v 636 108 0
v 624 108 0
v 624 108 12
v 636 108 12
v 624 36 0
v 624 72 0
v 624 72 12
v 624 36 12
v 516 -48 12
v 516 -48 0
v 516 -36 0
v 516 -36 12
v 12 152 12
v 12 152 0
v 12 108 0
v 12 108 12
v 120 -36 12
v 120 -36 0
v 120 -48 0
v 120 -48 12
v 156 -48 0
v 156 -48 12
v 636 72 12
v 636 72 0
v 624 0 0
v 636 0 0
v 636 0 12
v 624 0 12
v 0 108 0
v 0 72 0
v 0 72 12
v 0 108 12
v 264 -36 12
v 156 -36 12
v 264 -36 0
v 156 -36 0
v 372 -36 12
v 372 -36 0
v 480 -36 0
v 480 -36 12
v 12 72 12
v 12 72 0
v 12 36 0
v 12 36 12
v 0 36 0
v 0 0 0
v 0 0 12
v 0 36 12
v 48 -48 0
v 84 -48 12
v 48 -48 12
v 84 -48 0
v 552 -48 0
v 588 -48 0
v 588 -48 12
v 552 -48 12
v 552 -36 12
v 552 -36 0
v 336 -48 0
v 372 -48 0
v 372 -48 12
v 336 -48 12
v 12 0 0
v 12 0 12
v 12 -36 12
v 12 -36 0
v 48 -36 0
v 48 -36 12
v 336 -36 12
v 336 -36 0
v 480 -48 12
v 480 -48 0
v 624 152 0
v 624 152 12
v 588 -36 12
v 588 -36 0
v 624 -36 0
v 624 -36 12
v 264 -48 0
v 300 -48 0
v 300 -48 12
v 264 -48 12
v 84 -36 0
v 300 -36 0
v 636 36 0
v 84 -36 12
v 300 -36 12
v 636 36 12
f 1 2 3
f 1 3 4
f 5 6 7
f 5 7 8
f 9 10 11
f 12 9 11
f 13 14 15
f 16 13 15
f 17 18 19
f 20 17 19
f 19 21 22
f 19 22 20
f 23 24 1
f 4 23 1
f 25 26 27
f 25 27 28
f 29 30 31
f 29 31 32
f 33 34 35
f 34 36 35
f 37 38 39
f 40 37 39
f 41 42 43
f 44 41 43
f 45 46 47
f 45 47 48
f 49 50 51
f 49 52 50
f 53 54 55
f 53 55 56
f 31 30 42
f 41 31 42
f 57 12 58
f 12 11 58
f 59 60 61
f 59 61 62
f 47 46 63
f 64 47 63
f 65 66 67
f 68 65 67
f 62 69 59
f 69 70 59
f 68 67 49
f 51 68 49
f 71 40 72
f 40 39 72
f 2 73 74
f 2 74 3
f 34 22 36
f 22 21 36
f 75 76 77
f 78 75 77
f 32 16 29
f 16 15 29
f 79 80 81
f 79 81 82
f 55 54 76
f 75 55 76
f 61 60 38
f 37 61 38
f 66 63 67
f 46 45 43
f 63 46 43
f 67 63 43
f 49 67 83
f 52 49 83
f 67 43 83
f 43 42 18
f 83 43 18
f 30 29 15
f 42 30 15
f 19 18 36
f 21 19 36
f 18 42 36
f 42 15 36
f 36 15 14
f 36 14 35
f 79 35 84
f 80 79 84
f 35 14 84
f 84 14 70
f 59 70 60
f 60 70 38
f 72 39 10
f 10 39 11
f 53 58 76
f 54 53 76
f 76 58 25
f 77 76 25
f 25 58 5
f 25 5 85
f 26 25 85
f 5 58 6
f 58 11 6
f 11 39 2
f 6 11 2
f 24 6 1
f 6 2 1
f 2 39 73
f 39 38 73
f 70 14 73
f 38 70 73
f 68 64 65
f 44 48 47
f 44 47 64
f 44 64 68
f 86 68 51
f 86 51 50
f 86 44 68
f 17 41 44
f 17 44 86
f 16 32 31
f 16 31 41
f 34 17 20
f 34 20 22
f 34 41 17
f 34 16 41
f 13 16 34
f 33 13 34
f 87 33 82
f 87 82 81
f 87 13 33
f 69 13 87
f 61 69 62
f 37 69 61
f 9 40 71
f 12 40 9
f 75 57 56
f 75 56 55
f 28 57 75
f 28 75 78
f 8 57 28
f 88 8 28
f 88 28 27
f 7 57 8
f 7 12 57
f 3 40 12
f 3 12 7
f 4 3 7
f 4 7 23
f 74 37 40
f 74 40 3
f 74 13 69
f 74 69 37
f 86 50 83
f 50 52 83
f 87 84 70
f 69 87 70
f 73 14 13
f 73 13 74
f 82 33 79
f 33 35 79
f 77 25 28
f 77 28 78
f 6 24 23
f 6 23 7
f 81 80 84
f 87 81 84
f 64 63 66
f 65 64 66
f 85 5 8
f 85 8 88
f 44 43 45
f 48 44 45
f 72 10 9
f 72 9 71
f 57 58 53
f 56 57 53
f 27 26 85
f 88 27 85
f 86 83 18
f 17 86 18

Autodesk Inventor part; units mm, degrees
ref_plane "YZ Plane" through (0, 0, 0) normal (1, 0, 0) x (0, 1, 0)
ref_plane "XZ Plane" through (0, 0, 0) normal (0, 1, 0) x (-1, 0, 0)
ref_plane "XY Plane" through (0, 0, 0) normal (0, 0, 1) x (1, 0, 0)
ref_plane "Work Plane1" through (0, 0, 0) normal (0, 0, 1) x (1, 0, 0)
sketch "Sketch1" plane through (0, 0, 0) normal (0, 0, 1) x (1, 0, 0)
  line L0 (0, 72) -> (12, 72)
  line L1 (12, 108) -> (12, 72)
  line L2 (12, 152) -> (12, 108)
  line L3 (0, 152) -> (12, 152)
  line L4 (0, 108) -> (0, 152)
  line L5 (12, 108) -> (0, 108)
  line L6 (0, 72) -> (0, 108)
  line L7 (0, 36) -> (0, 72)
  line L8 (12, 36) -> (0, 36)
  line L9 (12, 36) -> (12, 0)
  line L10 (0, 0) -> (12, 0)
  line L11 (0, -36) -> (0, 0)
  line L12 (12, -36) -> (0, -36)
  line L13 (12, 0) -> (12, -36)
  line L14 (12, 72) -> (12, 36)
  line L15 (0, 0) -> (0, 36)
  line L16 (636, -36) -> (636, -48)
  line L17 (636, -48) -> (588, -48)
  line L18 (588, -48) -> (588, -36)
  line L19 (552, -36) -> (588, -36)
  line L20 (552, -36) -> (552, -48)
  line L21 (552, -48) -> (516, -48)
  line L22 (516, -48) -> (516, -36)
  line L23 (480, -36) -> (516, -36)
  line L24 (480, -36) -> (480, -48)
  line L25 (480, -48) -> (444, -48)
  line L26 (444, -48) -> (444, -36)
  line L27 (408, -36) -> (444, -36)
  line L28 (408, -36) -> (408, -48)
  line L29 (408, -48) -> (372, -48)
  line L30 (372, -48) -> (372, -36)
  line L31 (336, -36) -> (372, -36)
  line L32 (336, -36) -> (336, -48)
  line L33 (336, -48) -> (300, -48)
  line L34 (300, -48) -> (300, -36)
  line L35 (264, -36) -> (300, -36)
  line L36 (264, -36) -> (264, -48)
  line L37 (264, -48) -> (228, -48)
  line L38 (228, -48) -> (228, -36)
  line L39 (192, -36) -> (228, -36)
  line L40 (192, -36) -> (192, -48)
  line L41 (192, -48) -> (156, -48)
  line L42 (156, -48) -> (156, -36)
  line L43 (120, -36) -> (156, -36)
  line L44 (120, -36) -> (120, -48)
  line L45 (120, -48) -> (84, -48)
  line L46 (84, -48) -> (84, -36)
  line L47 (48, -36) -> (84, -36)
  line L48 (48, -36) -> (48, -48)
  line L49 (48, -48) -> (0, -48)
  line L50 (0, -48) -> (0, -36)
  line L51 (0, -36) -> (48, -36)
  line L52 (588, -36) -> (636, -36)
  line L53 (588, -48) -> (552, -48)
  line L54 (516, -36) -> (552, -36)
  line L55 (516, -48) -> (480, -48)
  line L56 (444, -36) -> (480, -36)
  line L57 (444, -48) -> (408, -48)
  line L58 (372, -36) -> (408, -36)
  line L59 (372, -48) -> (336, -48)
  line L60 (300, -36) -> (336, -36)
  line L61 (300, -48) -> (264, -48)
  line L62 (228, -36) -> (264, -36)
  line L63 (228, -48) -> (192, -48)
  line L64 (156, -36) -> (192, -36)
  line L65 (156, -48) -> (120, -48)
  line L66 (84, -36) -> (120, -36)
  line L67 (84, -48) -> (48, -48)
  line L68 (12, 152) -> (624, 152)
  line L69 (636, -36) -> (12, -36)
  line L70 (12, -36) -> (12, 152)
  line L71 (318, 152) -> (318, 58) construction
  line L72 (318, 58) -> (636, 58) construction
  line L73 (12, 152) -> (0, 152)
  line L74 (636, 152) -> (636, 164)
  line L75 (636, 164) -> (588, 164)
  line L76 (588, 164) -> (588, 152)
  line L77 (552, 152) -> (588, 152)
  line L78 (552, 152) -> (552, 164)
  line L79 (552, 164) -> (516, 164)
  line L80 (516, 164) -> (516, 152)
  line L81 (480, 152) -> (516, 152)
  line L82 (480, 152) -> (480, 164)
  line L83 (480, 164) -> (444, 164)
  line L84 (444, 164) -> (444, 152)
  line L85 (408, 152) -> (444, 152)
  line L86 (408, 152) -> (408, 164)
  line L87 (408, 164) -> (372, 164)
  line L88 (372, 164) -> (372, 152)
  line L89 (336, 152) -> (372, 152)
  line L90 (336, 152) -> (336, 164)
  line L91 (336, 164) -> (300, 164)
  line L92 (300, 164) -> (300, 152)
  line L93 (264, 152) -> (300, 152)
  line L94 (264, 152) -> (264, 164)
  line L95 (264, 164) -> (228, 164)
  line L96 (228, 164) -> (228, 152)
  line L97 (192, 152) -> (228, 152)
  line L98 (192, 152) -> (192, 164)
  line L99 (192, 164) -> (156, 164)
  line L100 (156, 164) -> (156, 152)
  line L101 (120, 152) -> (156, 152)
  line L102 (120, 152) -> (120, 164)
  line L103 (120, 164) -> (84, 164)
  line L104 (84, 164) -> (84, 152)
  line L105 (48, 152) -> (84, 152)
  line L106 (48, 152) -> (48, 164)
  line L107 (48, 164) -> (0, 164)
  line L108 (0, 164) -> (0, 152)
  line L109 (0, 152) -> (48, 152)
  line L110 (588, 152) -> (636, 152)
  line L111 (588, 164) -> (552, 164)
  line L112 (516, 152) -> (552, 152)
  line L113 (516, 164) -> (480, 164)
  line L114 (444, 152) -> (480, 152)
  line L115 (444, 164) -> (408, 164)
  line L116 (372, 152) -> (408, 152)
  line L117 (372, 164) -> (336, 164)
  line L118 (300, 152) -> (336, 152)
  line L119 (300, 164) -> (264, 164)
  line L120 (228, 152) -> (264, 152)
  line L121 (228, 164) -> (192, 164)
  line L122 (156, 152) -> (192, 152)
  line L123 (156, 164) -> (120, 164)
  line L124 (84, 152) -> (120, 152)
  line L125 (84, 164) -> (48, 164)
  line L126 (636, 152) -> (12, 152)
  line L127 (318, 152) -> (318, -36) construction
  line L128 (636, 72) -> (624, 72)
  line L129 (624, 108) -> (624, 72)
  line L130 (624, 152) -> (624, 108)
  line L131 (636, 152) -> (624, 152)
  line L132 (636, 108) -> (636, 152)
  line L133 (624, 108) -> (636, 108)
  line L134 (636, 72) -> (636, 108)
  line L135 (636, 36) -> (636, 72)
  line L136 (624, 36) -> (636, 36)
  line L137 (624, 36) -> (624, 0)
  line L138 (636, 0) -> (624, 0)
  line L139 (636, -36) -> (636, 0)
  line L140 (624, -36) -> (636, -36)
  line L141 (624, 0) -> (624, -36)
  line L142 (624, 72) -> (624, 36)
  line L143 (636, 0) -> (636, 36)
  line L144 (636, -48) -> (636, -36)
  line L145 (624, -36) -> (624, 152)
  line L146 (624, 152) -> (636, 152)
  line L147 (636, 164) -> (636, 152)
extrude "Extrusion1" add sketch "Sketch1" along normal blind 12 contours L6 L5 L1 L0 | L1 L2 L68 L130 L129 L142 L137 L141 L52 L19 L54 L23 L56 L27 L58 L31 L60 L35 L62 L39 L64 L43 L66 L47 L51 L13 L9 L14 | L8 L9 L10 L15 | L47 L46 L67 L48 | L43 L42 L65 L44 | L35 L34 L61 L36 | L31 L30 L59 L32 | L23 L22 L55 L24 | L19 L18 L53 L20 | L133 L134 L128 L129 | L137 L136 L143 L138
ref_plane "Work Plane2" through (0, -113.0256, -190.9643) normal (-1, 0, 0) x (0, -0.5, 0.866)
ref_plane "Work Plane3" through (0, -113.0256, -190.9643) normal (-1, 0, 0) x (0, -0.5, 0.866)
sketch "Sketch3" plane through (0, 0, 12) normal (0, 0, 1) x (1, 0, 0)
  line L0 (48, -36) -> (48, -48) projected
  line L1 (48, -48) -> (84, -48) projected
  line L2 (84, -48) -> (84, -36) projected
  line L3 (84, -36) -> (120, -36) projected
  line L4 (120, -36) -> (120, -48) projected
  line L5 (120, -48) -> (156, -48) projected
  line L6 (156, -48) -> (156, -36) projected
  line L7 (156, -36) -> (264, -36) projected
  line L8 (264, -36) -> (264, -48) projected
  line L9 (264, -48) -> (300, -48) projected
  line L10 (300, -48) -> (300, -36) projected
  line L11 (300, -36) -> (336, -36) projected
  line L12 (336, -36) -> (336, -48) projected
  line L13 (336, -48) -> (372, -48) projected
  line L14 (372, -48) -> (372, -36) projected
  line L15 (372, -36) -> (480, -36) projected
  line L16 (480, -36) -> (480, -48) projected
  line L17 (480, -48) -> (516, -48) projected
  line L18 (516, -48) -> (516, -36) projected
  line L19 (516, -36) -> (552, -36) projected
  line L20 (552, -36) -> (552, -48) projected
  line L21 (552, -48) -> (588, -48) projected
  line L22 (588, -48) -> (588, -36) projected
  line L23 (588, -36) -> (624, -36) projected
  line L24 (624, -36) -> (624, 0) projected
  line L25 (624, 0) -> (636, 0) projected
  line L26 (636, 0) -> (636, 36) projected
  line L27 (636, 36) -> (624, 36) projected
  line L28 (624, 36) -> (624, 72) projected
  line L29 (624, 72) -> (636, 72) projected
  line L30 (636, 72) -> (636, 108) projected
  line L31 (636, 108) -> (624, 108) projected
  line L32 (624, 108) -> (624, 152) projected
  line L33 (624, 152) -> (12, 152) projected
  line L34 (12, 152) -> (12, 108) projected
  line L35 (12, 108) -> (0, 108) projected
  line L36 (0, 108) -> (0, 72) projected
  line L37 (0, 72) -> (12, 72) projected
  line L38 (12, 72) -> (12, 36) projected
  line L39 (12, 36) -> (0, 36) projected
  line L40 (0, 36) -> (0, 0) projected
  line L41 (0, 0) -> (12, 0) projected
  line L42 (12, 0) -> (12, -36) projected
  line L43 (12, -36) -> (48, -36) projected
properties part number "wooden_back"
